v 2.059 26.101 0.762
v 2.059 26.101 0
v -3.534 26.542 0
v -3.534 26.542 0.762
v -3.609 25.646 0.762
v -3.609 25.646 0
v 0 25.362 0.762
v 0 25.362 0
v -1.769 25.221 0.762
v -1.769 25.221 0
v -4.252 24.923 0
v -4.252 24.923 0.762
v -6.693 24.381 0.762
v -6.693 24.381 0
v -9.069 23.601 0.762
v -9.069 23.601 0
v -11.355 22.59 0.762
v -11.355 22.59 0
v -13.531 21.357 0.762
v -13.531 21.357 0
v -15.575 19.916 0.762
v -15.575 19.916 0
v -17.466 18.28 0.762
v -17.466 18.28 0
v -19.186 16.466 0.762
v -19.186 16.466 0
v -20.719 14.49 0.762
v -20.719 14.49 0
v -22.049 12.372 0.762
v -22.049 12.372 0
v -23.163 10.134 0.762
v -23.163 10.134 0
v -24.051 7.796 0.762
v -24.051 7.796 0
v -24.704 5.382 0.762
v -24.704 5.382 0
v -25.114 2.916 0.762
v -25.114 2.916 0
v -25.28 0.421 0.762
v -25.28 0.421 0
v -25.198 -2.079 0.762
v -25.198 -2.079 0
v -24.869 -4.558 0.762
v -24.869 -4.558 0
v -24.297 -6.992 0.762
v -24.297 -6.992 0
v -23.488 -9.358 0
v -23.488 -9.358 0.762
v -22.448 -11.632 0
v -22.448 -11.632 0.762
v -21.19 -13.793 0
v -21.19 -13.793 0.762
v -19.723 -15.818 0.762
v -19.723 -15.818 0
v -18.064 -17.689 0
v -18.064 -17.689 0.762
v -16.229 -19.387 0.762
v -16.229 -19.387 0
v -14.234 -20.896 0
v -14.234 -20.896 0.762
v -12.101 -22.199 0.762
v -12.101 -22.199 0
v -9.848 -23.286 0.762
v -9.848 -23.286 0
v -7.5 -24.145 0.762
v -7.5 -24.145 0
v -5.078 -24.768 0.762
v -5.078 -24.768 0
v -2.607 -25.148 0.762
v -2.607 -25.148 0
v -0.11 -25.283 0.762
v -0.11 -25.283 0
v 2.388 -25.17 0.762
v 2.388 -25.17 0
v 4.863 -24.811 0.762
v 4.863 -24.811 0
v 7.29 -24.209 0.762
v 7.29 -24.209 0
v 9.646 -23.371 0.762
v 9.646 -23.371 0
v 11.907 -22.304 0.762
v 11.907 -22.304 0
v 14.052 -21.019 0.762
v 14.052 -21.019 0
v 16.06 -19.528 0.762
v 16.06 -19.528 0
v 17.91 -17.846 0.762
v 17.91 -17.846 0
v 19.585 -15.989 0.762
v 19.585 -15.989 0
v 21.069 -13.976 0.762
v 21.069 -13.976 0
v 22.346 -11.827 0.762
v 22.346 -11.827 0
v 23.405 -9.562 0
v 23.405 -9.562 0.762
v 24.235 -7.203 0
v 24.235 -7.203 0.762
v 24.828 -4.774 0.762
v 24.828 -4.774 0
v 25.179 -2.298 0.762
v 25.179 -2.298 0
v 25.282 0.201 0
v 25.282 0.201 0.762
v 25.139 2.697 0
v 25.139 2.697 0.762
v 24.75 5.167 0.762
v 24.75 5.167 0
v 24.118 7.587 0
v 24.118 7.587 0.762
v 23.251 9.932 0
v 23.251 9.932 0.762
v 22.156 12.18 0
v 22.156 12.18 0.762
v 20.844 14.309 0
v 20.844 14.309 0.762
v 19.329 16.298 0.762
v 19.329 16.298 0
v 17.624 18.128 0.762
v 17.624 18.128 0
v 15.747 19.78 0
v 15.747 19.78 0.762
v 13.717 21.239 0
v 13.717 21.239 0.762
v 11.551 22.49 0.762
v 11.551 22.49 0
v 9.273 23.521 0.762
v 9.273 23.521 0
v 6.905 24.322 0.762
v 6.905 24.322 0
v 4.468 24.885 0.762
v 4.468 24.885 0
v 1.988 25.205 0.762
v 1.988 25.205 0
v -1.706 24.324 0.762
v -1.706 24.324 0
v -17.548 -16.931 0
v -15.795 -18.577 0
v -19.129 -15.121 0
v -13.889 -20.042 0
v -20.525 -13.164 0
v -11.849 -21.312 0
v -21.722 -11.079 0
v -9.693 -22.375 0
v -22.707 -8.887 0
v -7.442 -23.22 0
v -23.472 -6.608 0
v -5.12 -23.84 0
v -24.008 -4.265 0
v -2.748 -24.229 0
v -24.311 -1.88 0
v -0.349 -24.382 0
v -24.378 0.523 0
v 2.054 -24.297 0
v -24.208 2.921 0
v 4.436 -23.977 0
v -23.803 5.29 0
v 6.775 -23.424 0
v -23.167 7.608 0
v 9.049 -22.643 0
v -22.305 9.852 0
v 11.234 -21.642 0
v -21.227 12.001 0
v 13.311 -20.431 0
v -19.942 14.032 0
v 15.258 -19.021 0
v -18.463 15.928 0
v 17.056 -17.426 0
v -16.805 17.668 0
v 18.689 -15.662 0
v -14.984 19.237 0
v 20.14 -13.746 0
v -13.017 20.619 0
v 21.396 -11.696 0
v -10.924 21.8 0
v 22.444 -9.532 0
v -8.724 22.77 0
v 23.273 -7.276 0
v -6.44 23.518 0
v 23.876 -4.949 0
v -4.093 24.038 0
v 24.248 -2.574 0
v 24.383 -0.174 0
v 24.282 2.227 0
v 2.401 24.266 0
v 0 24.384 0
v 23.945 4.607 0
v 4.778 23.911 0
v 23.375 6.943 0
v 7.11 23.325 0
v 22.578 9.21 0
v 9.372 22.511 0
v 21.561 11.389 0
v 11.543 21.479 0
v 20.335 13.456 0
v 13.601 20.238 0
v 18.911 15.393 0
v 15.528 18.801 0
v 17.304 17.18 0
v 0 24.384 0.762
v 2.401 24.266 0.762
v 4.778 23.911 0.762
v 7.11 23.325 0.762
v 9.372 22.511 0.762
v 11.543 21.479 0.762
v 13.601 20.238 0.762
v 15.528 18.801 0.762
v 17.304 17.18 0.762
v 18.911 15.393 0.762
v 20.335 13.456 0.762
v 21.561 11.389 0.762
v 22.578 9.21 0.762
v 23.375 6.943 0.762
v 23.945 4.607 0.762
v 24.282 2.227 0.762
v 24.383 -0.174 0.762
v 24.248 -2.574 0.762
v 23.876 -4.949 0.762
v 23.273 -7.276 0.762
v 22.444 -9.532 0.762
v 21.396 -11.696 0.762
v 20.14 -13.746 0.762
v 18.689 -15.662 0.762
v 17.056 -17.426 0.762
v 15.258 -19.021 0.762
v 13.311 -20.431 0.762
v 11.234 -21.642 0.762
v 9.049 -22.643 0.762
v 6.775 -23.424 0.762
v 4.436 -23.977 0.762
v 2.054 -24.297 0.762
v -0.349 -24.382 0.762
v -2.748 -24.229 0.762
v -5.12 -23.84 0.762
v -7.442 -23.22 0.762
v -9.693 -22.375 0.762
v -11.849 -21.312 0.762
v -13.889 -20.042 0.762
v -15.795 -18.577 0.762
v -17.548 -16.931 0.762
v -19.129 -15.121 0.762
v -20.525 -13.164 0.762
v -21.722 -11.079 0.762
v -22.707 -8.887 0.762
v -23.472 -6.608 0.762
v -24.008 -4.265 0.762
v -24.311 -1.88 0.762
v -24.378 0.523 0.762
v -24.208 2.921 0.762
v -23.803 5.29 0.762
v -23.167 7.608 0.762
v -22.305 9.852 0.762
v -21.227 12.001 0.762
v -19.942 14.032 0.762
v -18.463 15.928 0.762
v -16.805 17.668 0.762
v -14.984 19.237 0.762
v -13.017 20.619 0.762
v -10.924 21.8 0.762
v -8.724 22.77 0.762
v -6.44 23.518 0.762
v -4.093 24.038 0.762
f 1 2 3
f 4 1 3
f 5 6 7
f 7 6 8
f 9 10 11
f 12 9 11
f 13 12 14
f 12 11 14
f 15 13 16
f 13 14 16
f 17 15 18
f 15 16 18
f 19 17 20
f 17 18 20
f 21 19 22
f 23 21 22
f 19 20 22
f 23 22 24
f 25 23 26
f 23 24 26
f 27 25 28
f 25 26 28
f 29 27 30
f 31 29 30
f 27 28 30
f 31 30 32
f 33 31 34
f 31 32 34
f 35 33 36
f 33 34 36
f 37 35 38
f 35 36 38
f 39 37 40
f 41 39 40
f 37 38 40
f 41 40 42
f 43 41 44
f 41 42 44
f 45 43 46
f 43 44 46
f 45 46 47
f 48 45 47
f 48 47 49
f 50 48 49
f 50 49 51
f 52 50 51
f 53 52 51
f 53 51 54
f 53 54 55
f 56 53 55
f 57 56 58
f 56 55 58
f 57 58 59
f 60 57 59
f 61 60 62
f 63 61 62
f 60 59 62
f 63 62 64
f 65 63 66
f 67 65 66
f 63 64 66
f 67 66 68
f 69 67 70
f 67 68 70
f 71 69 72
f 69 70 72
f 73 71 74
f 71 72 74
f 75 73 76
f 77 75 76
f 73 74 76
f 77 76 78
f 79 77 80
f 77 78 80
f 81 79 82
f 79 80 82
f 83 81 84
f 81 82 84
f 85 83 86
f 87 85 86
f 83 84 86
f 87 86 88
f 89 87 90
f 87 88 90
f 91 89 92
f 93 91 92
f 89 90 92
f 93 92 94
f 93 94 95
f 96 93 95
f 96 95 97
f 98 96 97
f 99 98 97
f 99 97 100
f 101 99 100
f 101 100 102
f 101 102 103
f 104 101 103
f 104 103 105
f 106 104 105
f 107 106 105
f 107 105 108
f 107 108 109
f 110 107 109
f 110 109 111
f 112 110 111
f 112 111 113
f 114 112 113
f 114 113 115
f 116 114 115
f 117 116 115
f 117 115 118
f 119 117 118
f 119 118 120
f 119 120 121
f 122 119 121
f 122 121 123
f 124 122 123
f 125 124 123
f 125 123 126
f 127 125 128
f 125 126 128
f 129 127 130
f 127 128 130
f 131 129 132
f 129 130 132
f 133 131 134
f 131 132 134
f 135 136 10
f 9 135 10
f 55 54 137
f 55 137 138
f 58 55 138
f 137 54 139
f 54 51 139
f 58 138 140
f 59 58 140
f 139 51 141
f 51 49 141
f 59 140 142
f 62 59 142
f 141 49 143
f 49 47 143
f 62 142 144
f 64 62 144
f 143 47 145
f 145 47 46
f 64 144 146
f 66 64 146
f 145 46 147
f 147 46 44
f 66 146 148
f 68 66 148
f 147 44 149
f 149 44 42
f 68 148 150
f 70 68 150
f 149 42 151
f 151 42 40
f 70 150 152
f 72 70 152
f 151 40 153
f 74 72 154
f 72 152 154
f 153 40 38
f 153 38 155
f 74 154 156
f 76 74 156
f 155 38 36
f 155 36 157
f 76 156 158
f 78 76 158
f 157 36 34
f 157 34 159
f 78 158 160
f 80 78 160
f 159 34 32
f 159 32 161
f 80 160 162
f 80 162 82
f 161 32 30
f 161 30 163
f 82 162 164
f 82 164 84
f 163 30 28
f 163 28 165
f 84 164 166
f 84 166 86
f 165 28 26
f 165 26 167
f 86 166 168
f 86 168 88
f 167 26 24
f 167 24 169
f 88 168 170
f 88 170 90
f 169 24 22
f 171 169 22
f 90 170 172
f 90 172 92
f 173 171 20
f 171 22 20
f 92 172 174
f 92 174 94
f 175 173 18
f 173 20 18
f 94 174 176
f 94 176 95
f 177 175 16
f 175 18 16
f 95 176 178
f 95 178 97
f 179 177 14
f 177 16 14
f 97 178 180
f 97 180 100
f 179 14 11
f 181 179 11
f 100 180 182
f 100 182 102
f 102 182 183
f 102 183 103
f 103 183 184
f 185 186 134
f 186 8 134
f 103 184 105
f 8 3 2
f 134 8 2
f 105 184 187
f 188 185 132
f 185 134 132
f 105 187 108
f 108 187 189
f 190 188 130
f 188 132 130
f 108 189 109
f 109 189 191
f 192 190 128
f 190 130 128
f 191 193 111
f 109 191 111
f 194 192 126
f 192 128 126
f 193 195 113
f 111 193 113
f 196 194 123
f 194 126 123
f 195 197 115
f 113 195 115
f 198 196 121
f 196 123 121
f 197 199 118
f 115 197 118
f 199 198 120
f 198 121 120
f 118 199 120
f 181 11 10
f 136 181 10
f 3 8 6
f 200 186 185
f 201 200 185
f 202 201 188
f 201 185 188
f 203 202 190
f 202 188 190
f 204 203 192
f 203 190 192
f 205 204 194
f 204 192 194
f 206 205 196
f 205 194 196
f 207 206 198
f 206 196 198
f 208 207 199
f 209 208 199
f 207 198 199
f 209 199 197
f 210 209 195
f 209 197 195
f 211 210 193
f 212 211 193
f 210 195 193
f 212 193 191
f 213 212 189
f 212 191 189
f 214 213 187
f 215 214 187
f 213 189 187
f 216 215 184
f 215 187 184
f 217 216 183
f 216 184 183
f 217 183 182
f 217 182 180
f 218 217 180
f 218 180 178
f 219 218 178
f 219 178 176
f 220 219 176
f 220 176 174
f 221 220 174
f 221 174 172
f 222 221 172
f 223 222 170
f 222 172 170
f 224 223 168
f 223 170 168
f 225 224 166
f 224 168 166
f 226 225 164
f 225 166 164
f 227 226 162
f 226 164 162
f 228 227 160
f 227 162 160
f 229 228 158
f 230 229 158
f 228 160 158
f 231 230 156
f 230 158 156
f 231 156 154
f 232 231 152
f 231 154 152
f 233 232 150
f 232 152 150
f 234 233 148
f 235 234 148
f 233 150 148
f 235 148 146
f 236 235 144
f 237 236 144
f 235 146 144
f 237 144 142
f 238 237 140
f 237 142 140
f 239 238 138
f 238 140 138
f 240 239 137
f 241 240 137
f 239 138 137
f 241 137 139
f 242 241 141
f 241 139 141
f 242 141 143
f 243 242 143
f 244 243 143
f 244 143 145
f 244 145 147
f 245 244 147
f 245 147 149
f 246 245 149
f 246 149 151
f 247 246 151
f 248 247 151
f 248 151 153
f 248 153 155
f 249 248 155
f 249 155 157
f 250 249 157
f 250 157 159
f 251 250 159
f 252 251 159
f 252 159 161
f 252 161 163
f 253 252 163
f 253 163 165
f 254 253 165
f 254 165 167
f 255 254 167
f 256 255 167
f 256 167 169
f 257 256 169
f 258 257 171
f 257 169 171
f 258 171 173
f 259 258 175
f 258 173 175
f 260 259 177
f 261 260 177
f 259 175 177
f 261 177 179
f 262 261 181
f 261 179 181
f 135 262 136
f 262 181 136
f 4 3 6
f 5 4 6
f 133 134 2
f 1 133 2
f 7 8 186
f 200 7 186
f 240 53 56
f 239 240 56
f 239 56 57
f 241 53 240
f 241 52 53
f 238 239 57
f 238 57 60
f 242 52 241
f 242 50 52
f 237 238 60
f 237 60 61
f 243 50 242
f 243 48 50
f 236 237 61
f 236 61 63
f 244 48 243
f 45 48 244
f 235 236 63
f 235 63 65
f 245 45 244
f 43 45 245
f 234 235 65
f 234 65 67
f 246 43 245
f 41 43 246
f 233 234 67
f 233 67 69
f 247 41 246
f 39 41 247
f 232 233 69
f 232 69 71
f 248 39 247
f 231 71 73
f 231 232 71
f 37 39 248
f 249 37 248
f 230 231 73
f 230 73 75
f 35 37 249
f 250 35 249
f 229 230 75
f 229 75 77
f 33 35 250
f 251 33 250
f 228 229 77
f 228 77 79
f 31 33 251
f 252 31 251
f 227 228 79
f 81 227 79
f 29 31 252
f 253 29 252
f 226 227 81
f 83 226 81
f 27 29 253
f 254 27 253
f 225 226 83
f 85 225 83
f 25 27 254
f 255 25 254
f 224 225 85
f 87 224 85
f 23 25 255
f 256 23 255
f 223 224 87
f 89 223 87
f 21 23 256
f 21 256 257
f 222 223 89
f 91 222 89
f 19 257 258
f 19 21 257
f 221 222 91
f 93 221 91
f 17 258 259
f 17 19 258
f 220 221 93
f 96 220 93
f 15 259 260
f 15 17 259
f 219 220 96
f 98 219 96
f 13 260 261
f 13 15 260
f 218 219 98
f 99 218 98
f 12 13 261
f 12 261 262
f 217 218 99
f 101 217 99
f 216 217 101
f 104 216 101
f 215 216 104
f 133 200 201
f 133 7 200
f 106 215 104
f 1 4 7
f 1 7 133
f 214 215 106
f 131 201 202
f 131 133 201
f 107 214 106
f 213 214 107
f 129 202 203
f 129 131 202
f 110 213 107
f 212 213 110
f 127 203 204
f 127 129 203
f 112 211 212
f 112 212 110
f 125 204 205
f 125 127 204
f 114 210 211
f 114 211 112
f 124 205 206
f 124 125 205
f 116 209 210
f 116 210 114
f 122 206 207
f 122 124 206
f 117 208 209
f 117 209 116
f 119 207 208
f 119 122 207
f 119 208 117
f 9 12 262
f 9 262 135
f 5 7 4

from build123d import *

# Parameters (mm, degrees)
F1_DEPTH = 0.762


with BuildPart() as f1:
    # F0 (on Top) → F1 (new body)
    with BuildSketch(Plane.XY):
        with BuildLine():
            ThreePointArc((0, 24.384), (0.853544, -24.369057), (-1.706041, 24.324245))
            Line((-1.706041, 24.324245), (-1.768951, 25.221201))
            ThreePointArc((-1.768951, 25.221201), (-0.10991, -25.282921), (1.988164, 25.204868))
            Line((1.988164, 25.204868), (2.05887, 26.101239))
            Line((2.05887, 26.101239), (-3.534211, 26.542422))
            Line((-3.534211, 26.542422), (-3.609026, 25.646375))
            Line((-3.609026, 25.646375), (0, 25.361695))
            Line((0, 25.361695), (0, 24.384))
        make_face()
    extrude(amount=F1_DEPTH)


solid = f1.part
